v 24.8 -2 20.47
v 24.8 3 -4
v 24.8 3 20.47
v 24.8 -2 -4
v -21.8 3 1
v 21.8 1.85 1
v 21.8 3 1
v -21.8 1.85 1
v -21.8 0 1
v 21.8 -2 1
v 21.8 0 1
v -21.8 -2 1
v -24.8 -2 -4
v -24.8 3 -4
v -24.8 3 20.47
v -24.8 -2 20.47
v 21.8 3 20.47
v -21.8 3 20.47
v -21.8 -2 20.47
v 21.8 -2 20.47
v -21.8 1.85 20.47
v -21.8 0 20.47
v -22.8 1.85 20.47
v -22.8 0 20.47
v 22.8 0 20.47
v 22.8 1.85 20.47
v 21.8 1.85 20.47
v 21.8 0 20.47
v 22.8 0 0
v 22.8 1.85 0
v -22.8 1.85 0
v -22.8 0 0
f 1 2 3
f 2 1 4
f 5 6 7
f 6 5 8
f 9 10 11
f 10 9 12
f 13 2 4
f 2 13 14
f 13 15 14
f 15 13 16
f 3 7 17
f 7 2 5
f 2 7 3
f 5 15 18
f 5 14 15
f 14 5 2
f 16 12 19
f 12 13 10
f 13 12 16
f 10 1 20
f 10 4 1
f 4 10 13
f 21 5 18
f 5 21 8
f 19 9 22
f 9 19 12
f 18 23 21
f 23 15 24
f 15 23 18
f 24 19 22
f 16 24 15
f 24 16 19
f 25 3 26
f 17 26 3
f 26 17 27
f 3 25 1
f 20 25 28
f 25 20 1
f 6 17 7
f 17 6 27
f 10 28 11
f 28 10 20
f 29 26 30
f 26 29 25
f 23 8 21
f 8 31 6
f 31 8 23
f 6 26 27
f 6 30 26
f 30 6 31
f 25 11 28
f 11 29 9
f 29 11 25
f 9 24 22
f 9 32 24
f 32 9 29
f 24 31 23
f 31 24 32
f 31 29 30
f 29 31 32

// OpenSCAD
// Horn for SainSmart HC-SR04 ultrasonic distance sensor
// from http://www.amazon.com/gp/product/B004U8TOE6/
// WARNING: similar devices (even with identical part number)
// have different dimensions, so measure yours before printing
// by J.Beale 30-Dec-2014

slop = 0.25; // allowance for printer tolerance
// ----------------------------------------------------
SSEP = 25.4; // center separation of ultrasonic xducers
SZ = 11.9; // height of transducer cylinders
SOD = 16.0+slop; // OD of transducer cylinders

PCBX = 45.35+slop; // length of PCB
PCBY = 20.5; // width of PCB
PCBZ = 1.6+slop; // z-height of PCB
XTLX = 10.3; // crystal length
XTLY = 4.53; // crystal width
XTLZ = 3.7; // crystal z-height
// HOD = 1.5; // ID of corner mounting holes ID
HOD = 0; // ID of corner mounting holes ID
HCX = 42.35; // X centers of mounting holes
HCY = 17.0; // Y centers of mounting holes
// ----------------------------------------------------

fn = 60; // facets on a circle
eps = 0.03; // a small number

module xducer() {
  translate([SSEP/2,0,0])
    cylinder(d=SOD, h=SZ, $fn=fn); // ult.xducer 1
  translate([-SSEP/2,0,0])
    cylinder(d=SOD, h=SZ, $fn=fn); // ult.xducer 2
}

module xtal() {
    translate([-XTLX/2,XTLY,0]) cube([XTLX,XTLY,XTLZ]);
    
}
module PCB() {
  difference() {
    translate([-PCBX/2,-PCBY/2,0])
      cube([PCBX,PCBY,PCBZ]);    
      // 4x mounting holes at corners
    translate([HCX/2,HCY/2,-PCBZ])
       cylinder(d=HOD, h=PCBZ*3, $fn=12);
    translate([-HCX/2,HCY/2,-PCBZ])
       cylinder(d=HOD, h=PCBZ*3, $fn=12);
    translate([HCX/2,-HCY/2,-PCBZ])
       cylinder(d=HOD, h=PCBZ*3, $fn=12);
    translate([-HCX/2,-HCY/2,-PCBZ])
       cylinder(d=HOD, h=PCBZ*3, $fn=12);
  }
}

module HCSR04() {
  color("grey") translate([0,0,PCBZ]) xducer();
  color([.1,.1,.6]) PCB();
  color([.6,.6,.6]) translate([0,0,PCBZ]) xtal();
  color([.8,.7,.7]) rotate([0,0,180]) 
    translate([0,5,PCBZ]) scale([1,.5,0.5]) xtal();
}


// =============================================================

// Draw a prism based on a right triangle
// l:length, w: width, h: height
// from https://github.com/dannystaple/OpenSCAD-Parts-Library/blob/master/prism.scad
module prism(l, w, h) {
  translate([0, l, 0]) rotate( a= [90, 0, 0])
  linear_extrude(height = l) polygon(points = [
    [0, 0],
    [w, 0],
    [0, h]
  ], paths=[[0,1,2,0]]);
}

BX = PCBX + 4; // mounting base X length
BY = 5; // mounting base Y width
BZ = 5; // mounting base Z thickness
SPX = 3; // side post X width
SPY = 5; // side post Y width
BMH = 32; // base mounting hole center spacing
BMHID = 3.2; // ID of base mounting holes
BMHY = BY-5.5; // mounting hole Y offset


module pcb_holder1() {
 difference() {
  intersection() {
    translate([-BX/2,-2,1-BZ]) cube([BX,BY,BZ]); // mounting base underneath
    translate([0,0,-BZ]) cylinder(d=BX+3, h=BZ*4, $fn=150); // round off edges
  }
  //translate([-BMH/2,BMHY,-BZ*2]) cylinder(d=BMHID, h=BZ*4, $fn=10); // hole 1
  //translate([BMH/2,BMHY,-BZ*2]) cylinder(d=BMHID, h=BZ*4, $fn=10); // hole 2    
  translate([0,BMHY-6,-BZ*2]) cylinder(d=BMHID, h=BZ*4, $fn=10); // hole 3    
  translate([-BX/2-eps,3.1,-2]) cube([BX+2*eps,BY,BZ]); // mounting base notch
 }
 translate([-BX/2,-2,0]) cube([SPX,SPY,PCBY-eps]); // side post 1
 translate([BX/2-SPX,-2,0]) cube([SPX,SPY,PCBY-eps]); // side post 2
 //translate([BX/2,2,-2]) rotate([0,0,90]) prism(2,6.8,20); // wedge1
 //translate([-BX/2+2,2,-2]) rotate([0,0,90]) prism(2,6.8,20); // wedge2
}

module pcb_holder() {
  difference() {
    pcb_holder1();
    translate([0,0,PCBY/2]) rotate([-90,0,0]) HCSR04();
  }
}

// translate([0,0,SZ+PCBZ]) horn();
// horn();
// translate([0,0,IDPTH-(SZ+PCBZ)]) HCSR04(); // ultrasonic transducer module

pcb_holder();
// translate([0,0,PCBY/2]) rotate([-90,0,0]) HCSR04();
